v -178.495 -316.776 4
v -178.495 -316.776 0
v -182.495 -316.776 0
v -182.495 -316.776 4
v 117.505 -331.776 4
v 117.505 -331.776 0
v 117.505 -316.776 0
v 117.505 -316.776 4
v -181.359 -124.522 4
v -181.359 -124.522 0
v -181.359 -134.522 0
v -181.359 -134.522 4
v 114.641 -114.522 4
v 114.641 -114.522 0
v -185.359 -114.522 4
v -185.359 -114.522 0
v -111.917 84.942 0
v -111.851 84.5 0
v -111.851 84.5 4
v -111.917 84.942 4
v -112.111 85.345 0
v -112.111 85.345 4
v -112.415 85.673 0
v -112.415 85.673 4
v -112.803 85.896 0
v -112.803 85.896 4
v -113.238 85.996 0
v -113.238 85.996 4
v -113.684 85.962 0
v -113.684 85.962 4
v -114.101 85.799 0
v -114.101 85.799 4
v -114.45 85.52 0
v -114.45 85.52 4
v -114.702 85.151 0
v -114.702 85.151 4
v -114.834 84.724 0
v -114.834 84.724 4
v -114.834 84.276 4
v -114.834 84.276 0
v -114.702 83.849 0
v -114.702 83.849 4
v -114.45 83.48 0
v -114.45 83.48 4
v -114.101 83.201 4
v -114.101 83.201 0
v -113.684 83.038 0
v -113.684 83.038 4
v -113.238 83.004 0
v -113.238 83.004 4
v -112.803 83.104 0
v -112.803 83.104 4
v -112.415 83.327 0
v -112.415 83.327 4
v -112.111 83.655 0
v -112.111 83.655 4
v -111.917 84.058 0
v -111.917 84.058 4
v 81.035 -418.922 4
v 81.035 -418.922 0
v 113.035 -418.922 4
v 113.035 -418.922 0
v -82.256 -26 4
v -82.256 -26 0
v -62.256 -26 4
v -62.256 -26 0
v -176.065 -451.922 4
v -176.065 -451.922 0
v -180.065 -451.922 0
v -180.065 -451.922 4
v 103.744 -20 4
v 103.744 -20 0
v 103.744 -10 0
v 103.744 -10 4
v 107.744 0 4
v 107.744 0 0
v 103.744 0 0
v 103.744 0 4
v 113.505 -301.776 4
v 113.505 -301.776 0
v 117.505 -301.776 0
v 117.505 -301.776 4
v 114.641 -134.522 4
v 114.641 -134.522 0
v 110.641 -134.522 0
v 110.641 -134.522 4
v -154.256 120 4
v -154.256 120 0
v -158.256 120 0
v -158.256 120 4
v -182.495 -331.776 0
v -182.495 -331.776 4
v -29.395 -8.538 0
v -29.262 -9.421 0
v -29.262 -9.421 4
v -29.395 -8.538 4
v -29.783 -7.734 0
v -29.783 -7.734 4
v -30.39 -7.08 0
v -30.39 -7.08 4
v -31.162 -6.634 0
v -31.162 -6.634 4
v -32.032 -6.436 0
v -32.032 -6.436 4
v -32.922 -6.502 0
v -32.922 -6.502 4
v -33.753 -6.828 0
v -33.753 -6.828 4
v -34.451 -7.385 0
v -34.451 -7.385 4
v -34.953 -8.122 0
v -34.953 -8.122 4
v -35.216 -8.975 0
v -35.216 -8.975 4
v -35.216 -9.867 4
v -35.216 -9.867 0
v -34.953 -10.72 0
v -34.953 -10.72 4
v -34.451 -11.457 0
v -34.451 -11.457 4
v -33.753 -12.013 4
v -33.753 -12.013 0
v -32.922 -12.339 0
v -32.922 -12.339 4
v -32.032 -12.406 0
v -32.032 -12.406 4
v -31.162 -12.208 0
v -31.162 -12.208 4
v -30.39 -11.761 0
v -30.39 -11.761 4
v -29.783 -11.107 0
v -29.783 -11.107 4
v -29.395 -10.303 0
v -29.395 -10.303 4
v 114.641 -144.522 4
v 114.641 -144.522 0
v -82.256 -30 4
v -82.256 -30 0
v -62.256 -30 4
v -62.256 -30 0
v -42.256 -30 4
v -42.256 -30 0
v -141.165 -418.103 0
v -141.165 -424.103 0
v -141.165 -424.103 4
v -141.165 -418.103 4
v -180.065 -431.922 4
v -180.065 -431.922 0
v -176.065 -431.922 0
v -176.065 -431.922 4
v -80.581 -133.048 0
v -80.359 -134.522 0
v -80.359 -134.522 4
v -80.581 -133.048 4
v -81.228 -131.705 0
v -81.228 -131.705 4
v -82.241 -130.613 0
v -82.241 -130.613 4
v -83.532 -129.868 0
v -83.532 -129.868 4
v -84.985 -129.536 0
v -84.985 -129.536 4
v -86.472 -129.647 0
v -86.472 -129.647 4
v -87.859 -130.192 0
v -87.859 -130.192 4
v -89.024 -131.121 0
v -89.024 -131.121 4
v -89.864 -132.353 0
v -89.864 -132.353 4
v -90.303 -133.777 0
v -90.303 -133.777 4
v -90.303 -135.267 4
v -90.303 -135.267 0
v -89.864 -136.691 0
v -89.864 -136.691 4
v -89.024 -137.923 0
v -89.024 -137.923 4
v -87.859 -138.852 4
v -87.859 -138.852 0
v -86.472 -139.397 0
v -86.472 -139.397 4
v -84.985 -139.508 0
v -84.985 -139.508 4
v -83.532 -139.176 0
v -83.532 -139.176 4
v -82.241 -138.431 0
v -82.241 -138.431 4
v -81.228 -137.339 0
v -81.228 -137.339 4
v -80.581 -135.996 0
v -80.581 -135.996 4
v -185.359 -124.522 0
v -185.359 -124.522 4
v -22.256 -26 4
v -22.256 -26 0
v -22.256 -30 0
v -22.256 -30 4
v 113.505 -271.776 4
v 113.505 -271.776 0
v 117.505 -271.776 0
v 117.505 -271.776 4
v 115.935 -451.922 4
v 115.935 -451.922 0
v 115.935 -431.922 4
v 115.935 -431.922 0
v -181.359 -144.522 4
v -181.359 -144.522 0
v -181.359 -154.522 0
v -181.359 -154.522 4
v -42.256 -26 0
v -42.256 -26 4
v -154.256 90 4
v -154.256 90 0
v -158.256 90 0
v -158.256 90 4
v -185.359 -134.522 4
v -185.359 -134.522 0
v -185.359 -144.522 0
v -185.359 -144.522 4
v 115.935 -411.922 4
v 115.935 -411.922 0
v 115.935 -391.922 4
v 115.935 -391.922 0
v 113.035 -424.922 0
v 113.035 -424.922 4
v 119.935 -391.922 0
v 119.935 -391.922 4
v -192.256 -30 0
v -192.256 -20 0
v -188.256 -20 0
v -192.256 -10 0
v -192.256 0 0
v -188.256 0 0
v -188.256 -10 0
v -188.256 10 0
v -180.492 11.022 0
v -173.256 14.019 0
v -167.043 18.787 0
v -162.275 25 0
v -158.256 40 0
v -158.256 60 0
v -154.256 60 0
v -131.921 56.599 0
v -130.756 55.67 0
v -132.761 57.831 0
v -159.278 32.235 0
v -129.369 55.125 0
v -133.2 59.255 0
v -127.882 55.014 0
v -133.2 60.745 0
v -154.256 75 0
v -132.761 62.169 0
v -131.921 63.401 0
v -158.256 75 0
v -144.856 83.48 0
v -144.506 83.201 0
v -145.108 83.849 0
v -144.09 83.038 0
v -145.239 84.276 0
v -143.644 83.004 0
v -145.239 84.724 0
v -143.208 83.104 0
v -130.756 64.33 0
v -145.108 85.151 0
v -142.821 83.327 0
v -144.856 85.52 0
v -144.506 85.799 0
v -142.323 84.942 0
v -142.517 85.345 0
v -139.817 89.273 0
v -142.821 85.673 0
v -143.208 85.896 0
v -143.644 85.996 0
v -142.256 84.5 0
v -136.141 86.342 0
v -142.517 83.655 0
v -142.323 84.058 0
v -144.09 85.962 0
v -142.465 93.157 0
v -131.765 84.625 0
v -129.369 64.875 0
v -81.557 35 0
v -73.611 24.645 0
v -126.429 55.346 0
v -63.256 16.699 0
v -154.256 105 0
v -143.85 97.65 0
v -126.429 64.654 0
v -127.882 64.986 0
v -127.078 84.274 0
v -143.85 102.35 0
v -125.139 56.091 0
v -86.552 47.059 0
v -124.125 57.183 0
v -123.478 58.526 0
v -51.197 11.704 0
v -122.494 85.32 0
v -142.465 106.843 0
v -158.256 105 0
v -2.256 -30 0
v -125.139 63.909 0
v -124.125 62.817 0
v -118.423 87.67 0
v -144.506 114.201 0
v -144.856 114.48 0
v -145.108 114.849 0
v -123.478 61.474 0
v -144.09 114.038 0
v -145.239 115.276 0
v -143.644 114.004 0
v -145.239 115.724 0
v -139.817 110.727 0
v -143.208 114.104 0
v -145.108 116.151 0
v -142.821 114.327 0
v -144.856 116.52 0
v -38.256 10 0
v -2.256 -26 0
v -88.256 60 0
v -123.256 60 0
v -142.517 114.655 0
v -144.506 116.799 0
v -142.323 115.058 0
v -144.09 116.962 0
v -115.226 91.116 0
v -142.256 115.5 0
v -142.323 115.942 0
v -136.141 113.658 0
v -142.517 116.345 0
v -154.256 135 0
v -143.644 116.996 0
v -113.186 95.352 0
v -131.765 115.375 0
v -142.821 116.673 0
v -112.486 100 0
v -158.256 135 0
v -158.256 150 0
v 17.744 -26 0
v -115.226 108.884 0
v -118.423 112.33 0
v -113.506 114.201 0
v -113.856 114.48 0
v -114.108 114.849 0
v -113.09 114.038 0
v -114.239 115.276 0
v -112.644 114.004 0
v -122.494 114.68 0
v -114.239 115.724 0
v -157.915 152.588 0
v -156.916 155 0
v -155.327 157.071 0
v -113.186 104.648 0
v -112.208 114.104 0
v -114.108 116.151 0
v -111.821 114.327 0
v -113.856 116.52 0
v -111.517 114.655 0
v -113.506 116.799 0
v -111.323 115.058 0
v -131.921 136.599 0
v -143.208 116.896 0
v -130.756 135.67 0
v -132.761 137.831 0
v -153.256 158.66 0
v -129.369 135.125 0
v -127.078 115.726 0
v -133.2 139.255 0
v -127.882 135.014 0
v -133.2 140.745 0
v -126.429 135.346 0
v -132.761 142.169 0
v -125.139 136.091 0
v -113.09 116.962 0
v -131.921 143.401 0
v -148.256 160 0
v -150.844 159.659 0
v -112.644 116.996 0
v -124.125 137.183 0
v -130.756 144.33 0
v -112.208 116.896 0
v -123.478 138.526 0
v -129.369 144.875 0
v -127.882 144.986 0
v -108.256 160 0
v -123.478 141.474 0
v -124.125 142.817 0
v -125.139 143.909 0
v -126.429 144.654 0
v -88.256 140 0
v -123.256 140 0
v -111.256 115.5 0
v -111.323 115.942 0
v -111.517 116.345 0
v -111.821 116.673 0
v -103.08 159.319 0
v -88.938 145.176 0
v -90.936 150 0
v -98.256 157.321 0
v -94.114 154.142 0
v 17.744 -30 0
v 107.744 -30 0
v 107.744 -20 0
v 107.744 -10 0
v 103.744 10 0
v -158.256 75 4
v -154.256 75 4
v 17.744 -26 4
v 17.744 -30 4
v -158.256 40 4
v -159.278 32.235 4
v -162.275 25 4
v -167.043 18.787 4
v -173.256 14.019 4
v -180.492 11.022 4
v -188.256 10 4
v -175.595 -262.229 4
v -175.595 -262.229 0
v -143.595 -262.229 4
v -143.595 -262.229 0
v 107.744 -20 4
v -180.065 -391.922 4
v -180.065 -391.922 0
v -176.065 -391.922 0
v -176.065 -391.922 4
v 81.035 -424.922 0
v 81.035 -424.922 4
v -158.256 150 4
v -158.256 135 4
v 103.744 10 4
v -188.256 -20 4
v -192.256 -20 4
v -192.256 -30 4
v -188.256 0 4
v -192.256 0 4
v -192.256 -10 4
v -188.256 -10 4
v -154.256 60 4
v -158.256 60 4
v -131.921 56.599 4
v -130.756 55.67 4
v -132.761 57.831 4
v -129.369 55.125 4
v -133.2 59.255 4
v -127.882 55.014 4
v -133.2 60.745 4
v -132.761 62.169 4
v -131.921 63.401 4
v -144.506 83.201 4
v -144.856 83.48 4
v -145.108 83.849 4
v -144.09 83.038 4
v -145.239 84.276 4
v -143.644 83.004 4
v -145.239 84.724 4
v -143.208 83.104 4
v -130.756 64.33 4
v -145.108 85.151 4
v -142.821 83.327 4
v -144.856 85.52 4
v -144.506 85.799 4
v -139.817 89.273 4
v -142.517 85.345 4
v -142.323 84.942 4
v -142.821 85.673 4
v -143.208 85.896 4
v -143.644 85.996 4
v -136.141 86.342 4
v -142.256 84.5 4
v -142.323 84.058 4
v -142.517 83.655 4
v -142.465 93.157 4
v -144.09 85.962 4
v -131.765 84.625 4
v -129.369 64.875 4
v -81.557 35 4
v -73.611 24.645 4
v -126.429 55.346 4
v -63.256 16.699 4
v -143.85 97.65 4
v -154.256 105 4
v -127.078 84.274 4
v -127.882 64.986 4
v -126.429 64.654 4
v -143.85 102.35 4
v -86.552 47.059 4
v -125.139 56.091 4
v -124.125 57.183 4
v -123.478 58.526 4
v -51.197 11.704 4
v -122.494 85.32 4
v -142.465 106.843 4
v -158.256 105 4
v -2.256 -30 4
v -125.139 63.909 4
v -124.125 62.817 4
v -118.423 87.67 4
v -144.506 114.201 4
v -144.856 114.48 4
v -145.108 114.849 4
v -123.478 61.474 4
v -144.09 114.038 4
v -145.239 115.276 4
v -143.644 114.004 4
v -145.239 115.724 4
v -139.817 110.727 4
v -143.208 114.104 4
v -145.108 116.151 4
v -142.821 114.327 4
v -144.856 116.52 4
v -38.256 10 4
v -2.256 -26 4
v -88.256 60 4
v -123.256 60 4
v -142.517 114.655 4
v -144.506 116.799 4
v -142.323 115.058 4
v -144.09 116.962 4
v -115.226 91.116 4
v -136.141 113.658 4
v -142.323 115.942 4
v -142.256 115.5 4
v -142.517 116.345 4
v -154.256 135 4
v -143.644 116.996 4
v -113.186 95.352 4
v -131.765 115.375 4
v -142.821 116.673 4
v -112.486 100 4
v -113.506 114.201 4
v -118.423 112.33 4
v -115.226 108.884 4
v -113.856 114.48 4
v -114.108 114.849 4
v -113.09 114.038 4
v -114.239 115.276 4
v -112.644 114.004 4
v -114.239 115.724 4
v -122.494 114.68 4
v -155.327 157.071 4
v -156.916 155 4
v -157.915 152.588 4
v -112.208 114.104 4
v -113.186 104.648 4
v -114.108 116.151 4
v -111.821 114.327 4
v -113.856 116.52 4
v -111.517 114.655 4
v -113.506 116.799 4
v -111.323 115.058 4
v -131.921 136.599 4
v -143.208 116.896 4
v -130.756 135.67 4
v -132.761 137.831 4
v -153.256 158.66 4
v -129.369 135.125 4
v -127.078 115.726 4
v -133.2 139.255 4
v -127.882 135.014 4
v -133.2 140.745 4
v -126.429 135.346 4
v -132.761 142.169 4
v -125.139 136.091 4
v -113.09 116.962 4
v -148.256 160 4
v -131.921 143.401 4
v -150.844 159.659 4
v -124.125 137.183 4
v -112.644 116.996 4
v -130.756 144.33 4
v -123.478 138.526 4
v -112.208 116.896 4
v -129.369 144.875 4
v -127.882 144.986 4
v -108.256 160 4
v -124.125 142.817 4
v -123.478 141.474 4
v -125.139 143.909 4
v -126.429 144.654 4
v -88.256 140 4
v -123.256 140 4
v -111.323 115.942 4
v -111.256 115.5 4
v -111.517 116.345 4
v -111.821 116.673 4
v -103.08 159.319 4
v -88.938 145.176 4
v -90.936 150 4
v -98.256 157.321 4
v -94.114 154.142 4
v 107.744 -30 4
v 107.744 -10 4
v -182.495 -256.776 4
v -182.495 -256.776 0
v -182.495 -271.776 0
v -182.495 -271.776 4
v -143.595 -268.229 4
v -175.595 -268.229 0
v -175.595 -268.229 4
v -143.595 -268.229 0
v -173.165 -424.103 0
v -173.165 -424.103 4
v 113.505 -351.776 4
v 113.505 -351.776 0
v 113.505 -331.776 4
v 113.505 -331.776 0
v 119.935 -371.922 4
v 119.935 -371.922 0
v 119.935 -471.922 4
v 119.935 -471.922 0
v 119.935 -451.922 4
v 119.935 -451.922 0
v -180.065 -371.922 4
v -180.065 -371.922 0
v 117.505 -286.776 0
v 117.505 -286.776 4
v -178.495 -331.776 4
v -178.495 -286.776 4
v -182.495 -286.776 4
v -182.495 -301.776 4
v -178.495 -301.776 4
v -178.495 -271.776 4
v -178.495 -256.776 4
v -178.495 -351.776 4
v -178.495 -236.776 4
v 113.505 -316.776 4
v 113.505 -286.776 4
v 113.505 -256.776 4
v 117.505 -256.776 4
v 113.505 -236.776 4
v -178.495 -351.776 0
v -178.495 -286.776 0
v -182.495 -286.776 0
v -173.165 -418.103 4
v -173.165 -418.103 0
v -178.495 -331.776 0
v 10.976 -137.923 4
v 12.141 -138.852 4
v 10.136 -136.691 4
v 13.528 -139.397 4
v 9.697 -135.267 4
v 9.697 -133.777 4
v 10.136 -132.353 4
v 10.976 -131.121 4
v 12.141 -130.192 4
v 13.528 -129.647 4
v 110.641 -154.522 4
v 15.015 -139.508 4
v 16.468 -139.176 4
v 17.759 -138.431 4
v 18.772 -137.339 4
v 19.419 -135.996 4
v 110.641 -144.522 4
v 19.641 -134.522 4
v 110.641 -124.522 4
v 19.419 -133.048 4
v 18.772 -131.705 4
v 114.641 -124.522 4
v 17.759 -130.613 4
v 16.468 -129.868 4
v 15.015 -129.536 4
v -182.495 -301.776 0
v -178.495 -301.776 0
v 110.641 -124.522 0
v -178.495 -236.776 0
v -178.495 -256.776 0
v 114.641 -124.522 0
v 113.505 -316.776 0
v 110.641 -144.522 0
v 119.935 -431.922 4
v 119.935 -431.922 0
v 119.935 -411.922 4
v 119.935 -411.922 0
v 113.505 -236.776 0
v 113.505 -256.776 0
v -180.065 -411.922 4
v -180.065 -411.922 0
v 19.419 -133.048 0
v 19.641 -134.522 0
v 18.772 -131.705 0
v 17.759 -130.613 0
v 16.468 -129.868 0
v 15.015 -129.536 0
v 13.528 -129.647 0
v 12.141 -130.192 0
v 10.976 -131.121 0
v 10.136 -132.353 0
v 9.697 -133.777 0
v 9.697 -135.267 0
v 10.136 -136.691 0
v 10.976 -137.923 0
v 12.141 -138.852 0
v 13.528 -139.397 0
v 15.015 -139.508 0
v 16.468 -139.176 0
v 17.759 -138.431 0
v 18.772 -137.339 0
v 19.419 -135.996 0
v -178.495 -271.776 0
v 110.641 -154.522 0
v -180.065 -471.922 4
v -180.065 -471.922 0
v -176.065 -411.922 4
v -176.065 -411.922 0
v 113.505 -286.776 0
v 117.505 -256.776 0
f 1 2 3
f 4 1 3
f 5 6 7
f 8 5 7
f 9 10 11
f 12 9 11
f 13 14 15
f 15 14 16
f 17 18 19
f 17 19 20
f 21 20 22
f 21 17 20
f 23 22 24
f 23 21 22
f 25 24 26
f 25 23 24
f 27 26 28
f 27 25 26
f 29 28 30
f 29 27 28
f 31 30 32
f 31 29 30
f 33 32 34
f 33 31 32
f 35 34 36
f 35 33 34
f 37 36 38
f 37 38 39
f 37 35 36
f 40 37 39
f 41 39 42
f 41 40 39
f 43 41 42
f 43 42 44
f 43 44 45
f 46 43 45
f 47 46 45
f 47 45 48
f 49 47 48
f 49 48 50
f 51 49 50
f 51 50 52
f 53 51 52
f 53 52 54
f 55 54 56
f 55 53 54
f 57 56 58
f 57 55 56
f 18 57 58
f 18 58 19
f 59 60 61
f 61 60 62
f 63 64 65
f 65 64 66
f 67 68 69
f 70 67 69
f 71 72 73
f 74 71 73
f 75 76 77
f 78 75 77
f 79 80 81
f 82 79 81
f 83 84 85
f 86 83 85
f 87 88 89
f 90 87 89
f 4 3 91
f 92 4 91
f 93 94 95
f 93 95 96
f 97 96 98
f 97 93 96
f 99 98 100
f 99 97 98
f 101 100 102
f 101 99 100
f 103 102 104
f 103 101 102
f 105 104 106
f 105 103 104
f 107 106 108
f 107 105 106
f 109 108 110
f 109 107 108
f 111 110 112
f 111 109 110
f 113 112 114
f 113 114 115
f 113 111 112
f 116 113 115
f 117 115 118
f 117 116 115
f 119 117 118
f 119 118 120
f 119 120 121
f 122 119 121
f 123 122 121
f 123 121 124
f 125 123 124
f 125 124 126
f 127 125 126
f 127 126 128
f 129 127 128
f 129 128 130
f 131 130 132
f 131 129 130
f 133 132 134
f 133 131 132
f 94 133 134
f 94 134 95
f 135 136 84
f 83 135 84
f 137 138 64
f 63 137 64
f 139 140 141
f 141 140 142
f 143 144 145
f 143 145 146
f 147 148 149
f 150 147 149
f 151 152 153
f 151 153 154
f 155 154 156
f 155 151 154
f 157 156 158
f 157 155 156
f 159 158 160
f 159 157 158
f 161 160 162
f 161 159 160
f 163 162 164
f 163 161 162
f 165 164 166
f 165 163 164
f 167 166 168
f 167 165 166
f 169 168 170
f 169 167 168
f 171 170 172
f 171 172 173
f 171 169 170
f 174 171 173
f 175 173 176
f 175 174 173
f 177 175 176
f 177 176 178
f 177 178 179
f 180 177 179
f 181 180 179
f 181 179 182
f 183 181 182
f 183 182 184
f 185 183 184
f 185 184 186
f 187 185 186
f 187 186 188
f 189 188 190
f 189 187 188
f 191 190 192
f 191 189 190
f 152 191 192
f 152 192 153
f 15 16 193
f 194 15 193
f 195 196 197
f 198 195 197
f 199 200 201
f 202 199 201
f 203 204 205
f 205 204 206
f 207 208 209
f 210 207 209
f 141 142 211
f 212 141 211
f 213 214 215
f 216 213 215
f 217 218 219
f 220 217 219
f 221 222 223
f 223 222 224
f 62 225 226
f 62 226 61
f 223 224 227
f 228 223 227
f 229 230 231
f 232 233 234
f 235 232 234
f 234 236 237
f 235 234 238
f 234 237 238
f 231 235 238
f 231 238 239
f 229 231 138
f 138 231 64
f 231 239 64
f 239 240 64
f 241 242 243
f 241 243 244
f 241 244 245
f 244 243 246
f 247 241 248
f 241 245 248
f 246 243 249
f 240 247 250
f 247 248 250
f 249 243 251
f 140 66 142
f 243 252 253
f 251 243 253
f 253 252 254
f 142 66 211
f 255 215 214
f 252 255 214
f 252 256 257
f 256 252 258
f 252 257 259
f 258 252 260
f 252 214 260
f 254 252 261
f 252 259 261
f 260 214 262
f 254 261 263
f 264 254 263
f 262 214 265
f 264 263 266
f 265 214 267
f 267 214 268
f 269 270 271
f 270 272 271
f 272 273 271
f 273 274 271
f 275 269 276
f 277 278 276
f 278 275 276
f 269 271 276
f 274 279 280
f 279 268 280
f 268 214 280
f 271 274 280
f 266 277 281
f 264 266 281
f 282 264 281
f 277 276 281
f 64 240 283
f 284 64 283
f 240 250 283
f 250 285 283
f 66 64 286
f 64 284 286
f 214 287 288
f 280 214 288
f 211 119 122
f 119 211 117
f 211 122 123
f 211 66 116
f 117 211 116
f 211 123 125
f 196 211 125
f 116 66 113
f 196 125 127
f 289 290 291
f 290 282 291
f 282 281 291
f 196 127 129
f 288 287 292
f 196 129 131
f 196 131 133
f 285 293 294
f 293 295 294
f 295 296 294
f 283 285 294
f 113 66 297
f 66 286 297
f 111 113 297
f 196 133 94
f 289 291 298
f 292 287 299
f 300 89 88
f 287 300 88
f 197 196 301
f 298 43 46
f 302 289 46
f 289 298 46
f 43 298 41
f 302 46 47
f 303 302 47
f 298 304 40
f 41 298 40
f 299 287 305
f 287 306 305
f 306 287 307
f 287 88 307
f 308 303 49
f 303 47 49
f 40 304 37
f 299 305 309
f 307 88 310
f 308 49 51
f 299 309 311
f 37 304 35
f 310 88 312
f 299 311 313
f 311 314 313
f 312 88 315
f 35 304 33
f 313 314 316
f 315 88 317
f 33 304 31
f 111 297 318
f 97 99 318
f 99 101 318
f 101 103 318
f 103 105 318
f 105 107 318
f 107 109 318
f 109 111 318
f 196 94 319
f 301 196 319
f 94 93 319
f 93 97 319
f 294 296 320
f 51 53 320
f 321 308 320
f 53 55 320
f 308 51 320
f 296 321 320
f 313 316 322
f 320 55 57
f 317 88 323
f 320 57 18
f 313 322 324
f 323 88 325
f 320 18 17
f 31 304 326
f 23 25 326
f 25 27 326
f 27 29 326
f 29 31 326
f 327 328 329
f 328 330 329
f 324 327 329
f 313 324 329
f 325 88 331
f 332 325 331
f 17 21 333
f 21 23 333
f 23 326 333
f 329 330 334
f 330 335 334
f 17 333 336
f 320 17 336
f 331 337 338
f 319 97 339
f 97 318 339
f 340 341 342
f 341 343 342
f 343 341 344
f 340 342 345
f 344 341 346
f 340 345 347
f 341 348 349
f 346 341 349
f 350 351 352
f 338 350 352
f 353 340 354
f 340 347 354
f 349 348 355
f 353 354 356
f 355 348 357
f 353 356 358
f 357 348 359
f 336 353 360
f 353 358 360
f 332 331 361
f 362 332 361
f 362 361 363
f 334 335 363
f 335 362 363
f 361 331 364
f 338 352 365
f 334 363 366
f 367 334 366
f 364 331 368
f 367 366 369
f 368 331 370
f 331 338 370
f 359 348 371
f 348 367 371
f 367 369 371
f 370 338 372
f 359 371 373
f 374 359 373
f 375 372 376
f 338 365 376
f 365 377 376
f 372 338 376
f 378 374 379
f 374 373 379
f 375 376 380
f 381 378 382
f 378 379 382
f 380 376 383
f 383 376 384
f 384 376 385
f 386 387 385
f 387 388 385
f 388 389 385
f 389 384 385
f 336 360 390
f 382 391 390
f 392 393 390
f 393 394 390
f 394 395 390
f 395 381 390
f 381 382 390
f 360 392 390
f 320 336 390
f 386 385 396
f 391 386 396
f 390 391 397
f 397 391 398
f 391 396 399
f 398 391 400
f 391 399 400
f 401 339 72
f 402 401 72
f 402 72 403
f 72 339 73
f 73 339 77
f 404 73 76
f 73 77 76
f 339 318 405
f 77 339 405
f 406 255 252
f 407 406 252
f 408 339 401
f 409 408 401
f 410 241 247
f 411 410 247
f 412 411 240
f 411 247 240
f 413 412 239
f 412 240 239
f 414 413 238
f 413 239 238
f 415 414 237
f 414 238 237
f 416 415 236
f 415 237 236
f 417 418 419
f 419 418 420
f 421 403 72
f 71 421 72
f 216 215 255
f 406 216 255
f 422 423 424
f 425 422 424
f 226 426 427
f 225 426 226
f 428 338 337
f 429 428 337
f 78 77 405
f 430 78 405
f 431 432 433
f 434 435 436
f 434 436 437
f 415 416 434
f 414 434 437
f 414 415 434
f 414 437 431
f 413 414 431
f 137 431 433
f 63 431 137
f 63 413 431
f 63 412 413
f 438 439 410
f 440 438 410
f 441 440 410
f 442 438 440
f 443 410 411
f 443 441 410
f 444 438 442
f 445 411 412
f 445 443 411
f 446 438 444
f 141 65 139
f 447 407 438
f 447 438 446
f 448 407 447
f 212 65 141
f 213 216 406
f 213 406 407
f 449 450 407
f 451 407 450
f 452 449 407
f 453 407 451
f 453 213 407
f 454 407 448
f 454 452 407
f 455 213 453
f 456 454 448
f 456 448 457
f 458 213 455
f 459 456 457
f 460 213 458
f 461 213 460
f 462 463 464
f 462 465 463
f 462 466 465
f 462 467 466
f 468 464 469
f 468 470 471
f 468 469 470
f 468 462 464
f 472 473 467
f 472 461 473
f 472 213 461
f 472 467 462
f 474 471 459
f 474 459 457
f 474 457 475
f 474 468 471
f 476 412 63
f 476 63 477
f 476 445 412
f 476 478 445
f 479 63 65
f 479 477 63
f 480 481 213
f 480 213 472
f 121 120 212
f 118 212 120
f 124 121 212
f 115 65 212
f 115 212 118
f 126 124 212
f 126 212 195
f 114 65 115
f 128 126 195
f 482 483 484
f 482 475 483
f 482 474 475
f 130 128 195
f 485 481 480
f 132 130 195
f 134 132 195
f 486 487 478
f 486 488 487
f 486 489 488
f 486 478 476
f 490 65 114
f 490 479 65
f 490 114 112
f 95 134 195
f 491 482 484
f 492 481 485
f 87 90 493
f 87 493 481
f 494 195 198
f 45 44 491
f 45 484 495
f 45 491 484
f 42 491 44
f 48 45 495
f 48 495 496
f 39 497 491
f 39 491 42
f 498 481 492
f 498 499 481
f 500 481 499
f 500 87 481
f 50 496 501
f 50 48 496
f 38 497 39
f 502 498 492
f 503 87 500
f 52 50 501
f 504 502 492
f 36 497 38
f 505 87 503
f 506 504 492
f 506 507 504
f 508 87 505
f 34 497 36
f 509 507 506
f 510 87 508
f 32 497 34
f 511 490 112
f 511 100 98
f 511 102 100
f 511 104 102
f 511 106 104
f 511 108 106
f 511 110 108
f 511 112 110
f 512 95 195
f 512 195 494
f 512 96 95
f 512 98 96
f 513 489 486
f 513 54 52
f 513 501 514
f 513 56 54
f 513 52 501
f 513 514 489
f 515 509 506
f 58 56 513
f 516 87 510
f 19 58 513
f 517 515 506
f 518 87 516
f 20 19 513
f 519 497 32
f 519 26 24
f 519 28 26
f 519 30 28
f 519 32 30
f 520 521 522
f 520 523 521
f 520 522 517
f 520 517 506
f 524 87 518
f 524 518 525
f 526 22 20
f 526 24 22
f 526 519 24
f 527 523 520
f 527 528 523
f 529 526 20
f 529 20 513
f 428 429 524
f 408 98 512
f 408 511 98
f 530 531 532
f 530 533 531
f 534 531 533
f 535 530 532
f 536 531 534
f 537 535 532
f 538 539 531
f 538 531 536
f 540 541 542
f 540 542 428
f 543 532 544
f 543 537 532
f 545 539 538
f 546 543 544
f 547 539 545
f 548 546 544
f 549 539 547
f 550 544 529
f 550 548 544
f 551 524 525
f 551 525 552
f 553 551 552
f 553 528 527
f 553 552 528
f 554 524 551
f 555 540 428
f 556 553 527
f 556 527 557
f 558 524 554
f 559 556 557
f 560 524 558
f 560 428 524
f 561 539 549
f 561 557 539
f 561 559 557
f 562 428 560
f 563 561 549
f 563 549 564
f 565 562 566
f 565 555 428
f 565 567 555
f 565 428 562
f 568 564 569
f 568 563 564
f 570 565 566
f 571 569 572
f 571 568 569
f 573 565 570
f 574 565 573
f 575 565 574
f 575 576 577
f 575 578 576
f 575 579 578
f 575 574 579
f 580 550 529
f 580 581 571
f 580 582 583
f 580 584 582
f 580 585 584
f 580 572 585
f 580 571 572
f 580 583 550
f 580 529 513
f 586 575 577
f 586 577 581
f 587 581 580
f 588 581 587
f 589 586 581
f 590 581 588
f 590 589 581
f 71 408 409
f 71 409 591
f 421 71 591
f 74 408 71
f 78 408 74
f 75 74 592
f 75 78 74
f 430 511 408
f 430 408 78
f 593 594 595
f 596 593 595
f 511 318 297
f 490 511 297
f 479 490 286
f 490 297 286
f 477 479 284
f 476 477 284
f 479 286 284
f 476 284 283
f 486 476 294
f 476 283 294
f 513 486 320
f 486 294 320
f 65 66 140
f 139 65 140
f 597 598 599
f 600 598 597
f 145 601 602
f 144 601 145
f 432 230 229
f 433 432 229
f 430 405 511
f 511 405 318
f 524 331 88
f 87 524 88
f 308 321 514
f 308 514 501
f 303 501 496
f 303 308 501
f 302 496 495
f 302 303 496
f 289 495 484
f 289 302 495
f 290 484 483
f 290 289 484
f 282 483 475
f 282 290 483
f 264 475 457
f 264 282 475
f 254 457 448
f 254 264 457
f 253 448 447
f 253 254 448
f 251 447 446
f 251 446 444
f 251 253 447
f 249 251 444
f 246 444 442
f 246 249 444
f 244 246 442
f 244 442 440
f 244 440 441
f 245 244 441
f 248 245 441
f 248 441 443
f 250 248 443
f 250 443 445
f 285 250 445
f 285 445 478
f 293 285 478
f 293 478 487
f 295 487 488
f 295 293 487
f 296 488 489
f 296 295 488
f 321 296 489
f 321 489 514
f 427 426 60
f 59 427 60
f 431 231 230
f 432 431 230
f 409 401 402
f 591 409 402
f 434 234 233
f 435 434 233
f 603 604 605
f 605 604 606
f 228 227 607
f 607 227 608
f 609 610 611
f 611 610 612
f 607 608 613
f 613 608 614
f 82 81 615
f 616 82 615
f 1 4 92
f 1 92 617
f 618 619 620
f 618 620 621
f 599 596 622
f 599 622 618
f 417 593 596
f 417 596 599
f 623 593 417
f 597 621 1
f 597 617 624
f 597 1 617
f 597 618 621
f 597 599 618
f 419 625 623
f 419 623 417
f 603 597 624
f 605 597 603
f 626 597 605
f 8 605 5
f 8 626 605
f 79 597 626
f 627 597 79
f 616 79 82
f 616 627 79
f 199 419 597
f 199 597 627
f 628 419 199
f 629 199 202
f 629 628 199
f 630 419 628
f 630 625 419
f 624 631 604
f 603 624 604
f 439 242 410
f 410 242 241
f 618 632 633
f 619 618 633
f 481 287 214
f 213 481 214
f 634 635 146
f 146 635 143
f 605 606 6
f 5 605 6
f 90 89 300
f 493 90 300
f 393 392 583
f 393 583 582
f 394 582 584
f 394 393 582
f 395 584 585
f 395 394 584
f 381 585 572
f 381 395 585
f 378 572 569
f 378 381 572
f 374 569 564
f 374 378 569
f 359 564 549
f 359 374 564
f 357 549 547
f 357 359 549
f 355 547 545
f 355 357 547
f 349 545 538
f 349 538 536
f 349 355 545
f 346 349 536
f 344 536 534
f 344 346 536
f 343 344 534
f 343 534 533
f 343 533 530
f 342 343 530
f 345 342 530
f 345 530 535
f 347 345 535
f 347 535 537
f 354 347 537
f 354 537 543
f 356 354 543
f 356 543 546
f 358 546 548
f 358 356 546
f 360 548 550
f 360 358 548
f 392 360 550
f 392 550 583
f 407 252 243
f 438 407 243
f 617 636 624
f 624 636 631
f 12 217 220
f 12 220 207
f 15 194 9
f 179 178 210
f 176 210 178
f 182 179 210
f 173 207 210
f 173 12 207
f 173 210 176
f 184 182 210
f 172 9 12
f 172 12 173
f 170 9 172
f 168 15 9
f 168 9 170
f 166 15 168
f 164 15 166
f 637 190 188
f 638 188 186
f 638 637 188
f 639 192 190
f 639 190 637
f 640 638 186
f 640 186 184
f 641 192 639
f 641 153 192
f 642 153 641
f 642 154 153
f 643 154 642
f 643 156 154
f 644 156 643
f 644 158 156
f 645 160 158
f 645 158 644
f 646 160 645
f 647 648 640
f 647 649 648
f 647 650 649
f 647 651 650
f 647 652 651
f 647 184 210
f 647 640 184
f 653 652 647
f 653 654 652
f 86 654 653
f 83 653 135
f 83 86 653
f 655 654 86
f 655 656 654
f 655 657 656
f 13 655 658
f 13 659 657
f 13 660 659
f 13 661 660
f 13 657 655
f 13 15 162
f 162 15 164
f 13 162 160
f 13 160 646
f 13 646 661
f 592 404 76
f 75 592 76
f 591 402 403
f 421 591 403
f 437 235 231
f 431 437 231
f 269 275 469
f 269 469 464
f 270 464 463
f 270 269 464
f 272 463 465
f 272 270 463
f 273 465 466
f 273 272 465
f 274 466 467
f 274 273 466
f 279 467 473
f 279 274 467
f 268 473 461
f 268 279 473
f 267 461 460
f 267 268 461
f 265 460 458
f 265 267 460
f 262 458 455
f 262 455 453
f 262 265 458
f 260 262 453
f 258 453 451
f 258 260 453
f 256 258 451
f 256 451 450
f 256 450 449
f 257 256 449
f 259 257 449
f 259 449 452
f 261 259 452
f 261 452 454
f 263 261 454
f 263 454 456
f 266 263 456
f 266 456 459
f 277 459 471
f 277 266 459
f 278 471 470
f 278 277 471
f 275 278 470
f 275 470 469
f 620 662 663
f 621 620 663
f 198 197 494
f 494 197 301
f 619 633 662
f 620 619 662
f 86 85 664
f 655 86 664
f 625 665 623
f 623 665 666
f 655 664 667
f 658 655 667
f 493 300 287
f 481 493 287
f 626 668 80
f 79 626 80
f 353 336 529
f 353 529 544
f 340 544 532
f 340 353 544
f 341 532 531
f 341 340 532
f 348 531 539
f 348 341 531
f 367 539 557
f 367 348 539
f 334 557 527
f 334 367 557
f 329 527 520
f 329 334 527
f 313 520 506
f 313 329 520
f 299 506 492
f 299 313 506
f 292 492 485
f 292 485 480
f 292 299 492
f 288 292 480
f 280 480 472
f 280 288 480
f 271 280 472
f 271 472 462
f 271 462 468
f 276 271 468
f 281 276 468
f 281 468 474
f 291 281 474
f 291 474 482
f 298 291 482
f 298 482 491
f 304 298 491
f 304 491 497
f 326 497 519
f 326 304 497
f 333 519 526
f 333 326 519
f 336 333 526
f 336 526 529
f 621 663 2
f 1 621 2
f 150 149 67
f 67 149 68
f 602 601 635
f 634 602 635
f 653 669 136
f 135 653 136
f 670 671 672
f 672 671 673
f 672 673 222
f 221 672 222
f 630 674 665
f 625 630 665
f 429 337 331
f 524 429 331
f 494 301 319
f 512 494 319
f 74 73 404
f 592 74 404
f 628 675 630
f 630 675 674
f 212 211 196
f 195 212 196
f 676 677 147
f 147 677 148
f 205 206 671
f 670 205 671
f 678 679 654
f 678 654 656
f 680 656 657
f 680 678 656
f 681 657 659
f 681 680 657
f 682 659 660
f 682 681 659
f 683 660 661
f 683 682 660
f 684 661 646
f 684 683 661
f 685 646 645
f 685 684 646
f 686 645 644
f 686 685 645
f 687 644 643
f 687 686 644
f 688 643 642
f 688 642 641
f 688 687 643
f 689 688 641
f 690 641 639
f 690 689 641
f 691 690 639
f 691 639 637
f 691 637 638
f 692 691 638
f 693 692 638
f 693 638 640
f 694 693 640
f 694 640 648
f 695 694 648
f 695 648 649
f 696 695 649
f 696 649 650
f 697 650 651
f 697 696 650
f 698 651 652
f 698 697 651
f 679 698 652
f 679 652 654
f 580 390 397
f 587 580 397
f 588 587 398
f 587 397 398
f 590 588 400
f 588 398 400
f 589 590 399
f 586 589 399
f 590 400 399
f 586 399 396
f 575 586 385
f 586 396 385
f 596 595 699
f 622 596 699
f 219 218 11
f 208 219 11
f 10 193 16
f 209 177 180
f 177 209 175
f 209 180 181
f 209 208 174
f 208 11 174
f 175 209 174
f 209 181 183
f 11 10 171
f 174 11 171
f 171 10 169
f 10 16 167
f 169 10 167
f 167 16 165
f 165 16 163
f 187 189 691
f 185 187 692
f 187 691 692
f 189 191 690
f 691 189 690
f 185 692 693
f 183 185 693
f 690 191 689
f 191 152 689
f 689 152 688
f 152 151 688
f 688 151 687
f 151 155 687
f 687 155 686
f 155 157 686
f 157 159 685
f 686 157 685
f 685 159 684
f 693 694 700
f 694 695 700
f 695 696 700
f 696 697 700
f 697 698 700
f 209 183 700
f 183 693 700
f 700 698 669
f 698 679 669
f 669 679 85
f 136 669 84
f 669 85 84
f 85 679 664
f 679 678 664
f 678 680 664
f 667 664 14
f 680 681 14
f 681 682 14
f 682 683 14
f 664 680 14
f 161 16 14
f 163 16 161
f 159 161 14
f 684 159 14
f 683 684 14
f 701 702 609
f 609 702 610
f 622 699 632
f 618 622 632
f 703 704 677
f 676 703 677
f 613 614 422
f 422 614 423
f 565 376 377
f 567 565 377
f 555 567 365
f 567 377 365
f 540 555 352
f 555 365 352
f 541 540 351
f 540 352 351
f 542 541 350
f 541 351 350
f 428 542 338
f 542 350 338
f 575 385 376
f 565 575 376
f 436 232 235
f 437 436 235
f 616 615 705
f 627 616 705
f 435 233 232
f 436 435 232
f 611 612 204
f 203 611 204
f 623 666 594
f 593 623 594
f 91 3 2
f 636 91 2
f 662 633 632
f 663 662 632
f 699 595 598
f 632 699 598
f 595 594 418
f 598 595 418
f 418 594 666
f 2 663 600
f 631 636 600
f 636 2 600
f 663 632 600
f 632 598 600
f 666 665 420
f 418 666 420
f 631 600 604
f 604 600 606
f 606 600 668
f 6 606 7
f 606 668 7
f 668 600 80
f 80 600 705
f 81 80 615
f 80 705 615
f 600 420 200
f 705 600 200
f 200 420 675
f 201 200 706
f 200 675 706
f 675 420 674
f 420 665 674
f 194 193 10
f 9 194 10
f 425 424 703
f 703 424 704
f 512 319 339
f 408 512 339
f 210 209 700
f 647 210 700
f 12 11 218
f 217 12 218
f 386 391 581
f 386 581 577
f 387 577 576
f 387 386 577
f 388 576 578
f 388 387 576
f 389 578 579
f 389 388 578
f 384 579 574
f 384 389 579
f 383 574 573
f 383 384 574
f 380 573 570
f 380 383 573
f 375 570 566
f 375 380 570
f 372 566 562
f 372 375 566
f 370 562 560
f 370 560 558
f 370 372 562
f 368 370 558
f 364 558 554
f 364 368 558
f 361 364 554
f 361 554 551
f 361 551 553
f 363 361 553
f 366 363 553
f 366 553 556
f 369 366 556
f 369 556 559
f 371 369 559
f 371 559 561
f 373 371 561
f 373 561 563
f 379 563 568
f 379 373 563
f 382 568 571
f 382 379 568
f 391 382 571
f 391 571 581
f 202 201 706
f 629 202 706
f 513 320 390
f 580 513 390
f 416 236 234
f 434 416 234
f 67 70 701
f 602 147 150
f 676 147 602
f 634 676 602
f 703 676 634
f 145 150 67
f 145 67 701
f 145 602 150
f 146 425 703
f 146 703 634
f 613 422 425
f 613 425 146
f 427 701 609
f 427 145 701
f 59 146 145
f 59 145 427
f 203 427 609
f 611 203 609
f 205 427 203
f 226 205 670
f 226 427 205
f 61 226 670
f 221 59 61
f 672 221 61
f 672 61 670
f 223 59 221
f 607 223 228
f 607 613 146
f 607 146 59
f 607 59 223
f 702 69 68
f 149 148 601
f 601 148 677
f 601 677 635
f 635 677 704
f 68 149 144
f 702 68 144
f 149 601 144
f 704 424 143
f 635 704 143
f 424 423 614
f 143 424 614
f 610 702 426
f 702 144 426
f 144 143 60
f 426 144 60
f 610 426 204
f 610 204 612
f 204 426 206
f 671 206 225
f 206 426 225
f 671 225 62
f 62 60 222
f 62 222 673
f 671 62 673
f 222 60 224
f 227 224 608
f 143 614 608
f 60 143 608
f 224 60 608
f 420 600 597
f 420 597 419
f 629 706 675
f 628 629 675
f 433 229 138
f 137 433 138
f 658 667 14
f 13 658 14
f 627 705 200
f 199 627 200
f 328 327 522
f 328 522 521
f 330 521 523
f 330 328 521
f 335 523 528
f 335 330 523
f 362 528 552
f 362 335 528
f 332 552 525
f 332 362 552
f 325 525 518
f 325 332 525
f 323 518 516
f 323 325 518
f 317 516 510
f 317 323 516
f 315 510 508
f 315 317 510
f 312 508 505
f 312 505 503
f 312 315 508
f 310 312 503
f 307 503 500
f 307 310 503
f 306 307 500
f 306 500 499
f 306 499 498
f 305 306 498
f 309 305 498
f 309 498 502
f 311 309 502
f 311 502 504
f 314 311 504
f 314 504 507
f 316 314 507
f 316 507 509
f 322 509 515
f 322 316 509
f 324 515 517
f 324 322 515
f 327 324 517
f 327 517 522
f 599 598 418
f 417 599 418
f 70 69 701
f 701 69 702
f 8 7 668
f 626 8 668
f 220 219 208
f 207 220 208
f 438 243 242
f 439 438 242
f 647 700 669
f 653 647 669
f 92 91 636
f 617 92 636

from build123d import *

# Parameters (mm, degrees)
F0_W     = 32
F0_H     = 6
F0_R     = 5
F0_R_2   = 1.5
F0_R_3   = 15.77051
F0_R_4   = 2.993649
F1_DEPTH = 4


with BuildPart() as f1:
    # F0 (on Top) → F1 (new body)
    with BuildSketch(Plane.XY):
        Polygon((119.934696, -371.921642), (-180.065304, -371.921642), (-180.065304, -391.921642), (-176.065304, -391.921642), (-176.065304, -411.921642), (-180.065304, -411.921642), (-180.065304, -431.921642), (-176.065304, -431.921642), (-176.065304, -451.921642), (-180.065304, -451.921642), (-180.065304, -471.921642), (119.934696, -471.921642), (119.934696, -451.921642), (115.934696, -451.921642), (115.934696, -431.921642), (119.934696, -431.921642), (119.934696, -411.921642), (115.934696, -411.921642), (115.934696, -391.921642), (119.934696, -391.921642), align=None)
        with Locations((-157.165304, -421.10312)):
            Rectangle(F0_W, F0_H, mode=Mode.SUBTRACT)
        with Locations((97.034696, -421.921642)):
            Rectangle(F0_W, F0_H, mode=Mode.SUBTRACT)
        Polygon((113.505091, -236.775755), (-178.494909, -236.775755), (-178.494909, -256.775755), (-182.494909, -256.775755), (-182.494909, -271.775755), (-178.494909, -271.775755), (-178.494909, -286.775755), (-182.494909, -286.775755), (-182.494909, -301.775755), (-178.494909, -301.775755), (-178.494909, -316.775755), (-182.494909, -316.775755), (-182.494909, -331.775755), (-178.494909, -331.775755), (-178.494909, -351.775755), (113.505091, -351.775755), (113.505091, -331.775755), (117.505091, -331.775755), (117.505091, -316.775755), (113.505091, -316.775755), (113.505091, -301.775755), (117.505091, -301.775755), (117.505091, -286.775755), (113.505091, -286.775755), (113.505091, -271.775755), (117.505091, -271.775755), (117.505091, -256.775755), (113.505091, -256.775755), align=None)
        with Locations((-159.594909, -265.228896)):
            Rectangle(F0_W, F0_H, mode=Mode.SUBTRACT)
        Polygon((-181.358927, -144.521972), (-181.358927, -154.521972), (110.641073, -154.521972), (110.641073, -144.521972), (114.641073, -144.521972), (114.641073, -134.521972), (110.641073, -134.521972), (110.641073, -124.521972), (114.641073, -124.521972), (114.641073, -114.521972), (-185.358927, -114.521972), (-185.358927, -124.521972), (-181.358927, -124.521972), (-181.358927, -134.521972), (-185.358927, -134.521972), (-185.358927, -144.521972), align=None)
        with Locations((-85.358927, -134.521972)):
            Circle(F0_R, mode=Mode.SUBTRACT)
        with Locations((14.641073, -134.521972)):
            Circle(F0_R, mode=Mode.SUBTRACT)
        with BuildLine():
            Line((-192.256095, -20), (-192.256095, -30))
            Line((-192.256095, -30), (-82.256095, -30))
            Line((-82.256095, -30), (-82.256095, -26))
            Line((-82.256095, -26), (-62.256095, -26))
            Line((-62.256095, -26), (-62.256095, -30))
            Line((-62.256095, -30), (-42.256095, -30))
            Line((-42.256095, -30), (-42.256095, -26))
            Line((-42.256095, -26), (-22.256095, -26))
            Line((-22.256095, -26), (-22.256095, -30))
            Line((-22.256095, -30), (-2.256095, -30))
            Line((-2.256095, -30), (-2.256095, -26))
            Line((-2.256095, -26), (17.743905, -26))
            Line((17.743905, -26), (17.743905, -30))
            Line((17.743905, -30), (107.743905, -30))
            Line((107.743905, -30), (107.743905, -20))
            Line((107.743905, -20), (103.743905, -20))
            Line((103.743905, -20), (103.743905, -10))
            Line((103.743905, -10), (107.743905, -10))
            Line((107.743905, -10), (107.743905, 0))
            Line((107.743905, 0), (103.743905, 0))
            Line((103.743905, 0), (103.743905, 10))
            Line((103.743905, 10), (-38.256095, 10))
            ThreePointArc((-38.256095, 10), (-73.611434, 24.644661), (-88.256095, 60))
            Line((-88.256095, 60), (-88.256095, 140))
            ThreePointArc((-88.256095, 140), (-94.113959, 154.142136), (-108.256095, 160))
            Line((-108.256095, 160), (-148.256095, 160))
            ThreePointArc((-148.256095, 160), (-155.327162, 157.071068), (-158.256095, 150))
            Line((-158.256095, 150), (-158.256095, 135))
            Line((-158.256095, 135), (-154.256095, 135))
            Line((-154.256095, 135), (-154.256095, 120))
            Line((-154.256095, 120), (-158.256095, 120))
            Line((-158.256095, 120), (-158.256095, 105))
            Line((-158.256095, 105), (-154.256095, 105))
            Line((-154.256095, 105), (-154.256095, 104.09586))
            Line((-154.256095, 104.09586), (-154.256095, 90))
            Line((-154.256095, 90), (-158.256095, 90))
            Line((-158.256095, 90), (-158.256095, 75))
            Line((-158.256095, 75), (-154.256095, 75))
            Line((-154.256095, 75), (-154.256095, 60))
            Line((-154.256095, 60), (-158.256095, 60))
            Line((-158.256095, 60), (-158.256095, 40))
            ThreePointArc((-158.256095, 40), (-167.042891, 18.786797), (-188.256095, 10))
            Line((-188.256095, 10), (-188.256095, 0))
            Line((-188.256095, 0), (-192.256095, 0))
            Line((-192.256095, 0), (-192.256095, -10))
            Line((-192.256095, -10), (-188.256095, -10))
            Line((-188.256095, -10), (-188.256095, -20))
            Line((-188.256095, -20), (-192.256095, -20))
        make_face()
        with Locations((-143.756095, 84.5)):
            Circle(F0_R_2, mode=Mode.SUBTRACT)
        with Locations((-128.256095, 60)):
            Circle(F0_R, mode=Mode.SUBTRACT)
        with Locations((-143.756095, 115.5)):
            Circle(F0_R_2, mode=Mode.SUBTRACT)
        with Locations((-128.256095, 100)):
            Circle(F0_R_3, mode=Mode.SUBTRACT)
        with Locations((-128.256095, 140)):
            Circle(F0_R, mode=Mode.SUBTRACT)
        with Locations((-113.350548, 84.5)):
            Circle(F0_R_2, mode=Mode.SUBTRACT)
        with Locations((-112.756095, 115.5)):
            Circle(F0_R_2, mode=Mode.SUBTRACT)
        with Locations((-32.256095, -9.42086)):
            Circle(F0_R_4, mode=Mode.SUBTRACT)
    extrude(amount=F1_DEPTH)


solid = f1.part
